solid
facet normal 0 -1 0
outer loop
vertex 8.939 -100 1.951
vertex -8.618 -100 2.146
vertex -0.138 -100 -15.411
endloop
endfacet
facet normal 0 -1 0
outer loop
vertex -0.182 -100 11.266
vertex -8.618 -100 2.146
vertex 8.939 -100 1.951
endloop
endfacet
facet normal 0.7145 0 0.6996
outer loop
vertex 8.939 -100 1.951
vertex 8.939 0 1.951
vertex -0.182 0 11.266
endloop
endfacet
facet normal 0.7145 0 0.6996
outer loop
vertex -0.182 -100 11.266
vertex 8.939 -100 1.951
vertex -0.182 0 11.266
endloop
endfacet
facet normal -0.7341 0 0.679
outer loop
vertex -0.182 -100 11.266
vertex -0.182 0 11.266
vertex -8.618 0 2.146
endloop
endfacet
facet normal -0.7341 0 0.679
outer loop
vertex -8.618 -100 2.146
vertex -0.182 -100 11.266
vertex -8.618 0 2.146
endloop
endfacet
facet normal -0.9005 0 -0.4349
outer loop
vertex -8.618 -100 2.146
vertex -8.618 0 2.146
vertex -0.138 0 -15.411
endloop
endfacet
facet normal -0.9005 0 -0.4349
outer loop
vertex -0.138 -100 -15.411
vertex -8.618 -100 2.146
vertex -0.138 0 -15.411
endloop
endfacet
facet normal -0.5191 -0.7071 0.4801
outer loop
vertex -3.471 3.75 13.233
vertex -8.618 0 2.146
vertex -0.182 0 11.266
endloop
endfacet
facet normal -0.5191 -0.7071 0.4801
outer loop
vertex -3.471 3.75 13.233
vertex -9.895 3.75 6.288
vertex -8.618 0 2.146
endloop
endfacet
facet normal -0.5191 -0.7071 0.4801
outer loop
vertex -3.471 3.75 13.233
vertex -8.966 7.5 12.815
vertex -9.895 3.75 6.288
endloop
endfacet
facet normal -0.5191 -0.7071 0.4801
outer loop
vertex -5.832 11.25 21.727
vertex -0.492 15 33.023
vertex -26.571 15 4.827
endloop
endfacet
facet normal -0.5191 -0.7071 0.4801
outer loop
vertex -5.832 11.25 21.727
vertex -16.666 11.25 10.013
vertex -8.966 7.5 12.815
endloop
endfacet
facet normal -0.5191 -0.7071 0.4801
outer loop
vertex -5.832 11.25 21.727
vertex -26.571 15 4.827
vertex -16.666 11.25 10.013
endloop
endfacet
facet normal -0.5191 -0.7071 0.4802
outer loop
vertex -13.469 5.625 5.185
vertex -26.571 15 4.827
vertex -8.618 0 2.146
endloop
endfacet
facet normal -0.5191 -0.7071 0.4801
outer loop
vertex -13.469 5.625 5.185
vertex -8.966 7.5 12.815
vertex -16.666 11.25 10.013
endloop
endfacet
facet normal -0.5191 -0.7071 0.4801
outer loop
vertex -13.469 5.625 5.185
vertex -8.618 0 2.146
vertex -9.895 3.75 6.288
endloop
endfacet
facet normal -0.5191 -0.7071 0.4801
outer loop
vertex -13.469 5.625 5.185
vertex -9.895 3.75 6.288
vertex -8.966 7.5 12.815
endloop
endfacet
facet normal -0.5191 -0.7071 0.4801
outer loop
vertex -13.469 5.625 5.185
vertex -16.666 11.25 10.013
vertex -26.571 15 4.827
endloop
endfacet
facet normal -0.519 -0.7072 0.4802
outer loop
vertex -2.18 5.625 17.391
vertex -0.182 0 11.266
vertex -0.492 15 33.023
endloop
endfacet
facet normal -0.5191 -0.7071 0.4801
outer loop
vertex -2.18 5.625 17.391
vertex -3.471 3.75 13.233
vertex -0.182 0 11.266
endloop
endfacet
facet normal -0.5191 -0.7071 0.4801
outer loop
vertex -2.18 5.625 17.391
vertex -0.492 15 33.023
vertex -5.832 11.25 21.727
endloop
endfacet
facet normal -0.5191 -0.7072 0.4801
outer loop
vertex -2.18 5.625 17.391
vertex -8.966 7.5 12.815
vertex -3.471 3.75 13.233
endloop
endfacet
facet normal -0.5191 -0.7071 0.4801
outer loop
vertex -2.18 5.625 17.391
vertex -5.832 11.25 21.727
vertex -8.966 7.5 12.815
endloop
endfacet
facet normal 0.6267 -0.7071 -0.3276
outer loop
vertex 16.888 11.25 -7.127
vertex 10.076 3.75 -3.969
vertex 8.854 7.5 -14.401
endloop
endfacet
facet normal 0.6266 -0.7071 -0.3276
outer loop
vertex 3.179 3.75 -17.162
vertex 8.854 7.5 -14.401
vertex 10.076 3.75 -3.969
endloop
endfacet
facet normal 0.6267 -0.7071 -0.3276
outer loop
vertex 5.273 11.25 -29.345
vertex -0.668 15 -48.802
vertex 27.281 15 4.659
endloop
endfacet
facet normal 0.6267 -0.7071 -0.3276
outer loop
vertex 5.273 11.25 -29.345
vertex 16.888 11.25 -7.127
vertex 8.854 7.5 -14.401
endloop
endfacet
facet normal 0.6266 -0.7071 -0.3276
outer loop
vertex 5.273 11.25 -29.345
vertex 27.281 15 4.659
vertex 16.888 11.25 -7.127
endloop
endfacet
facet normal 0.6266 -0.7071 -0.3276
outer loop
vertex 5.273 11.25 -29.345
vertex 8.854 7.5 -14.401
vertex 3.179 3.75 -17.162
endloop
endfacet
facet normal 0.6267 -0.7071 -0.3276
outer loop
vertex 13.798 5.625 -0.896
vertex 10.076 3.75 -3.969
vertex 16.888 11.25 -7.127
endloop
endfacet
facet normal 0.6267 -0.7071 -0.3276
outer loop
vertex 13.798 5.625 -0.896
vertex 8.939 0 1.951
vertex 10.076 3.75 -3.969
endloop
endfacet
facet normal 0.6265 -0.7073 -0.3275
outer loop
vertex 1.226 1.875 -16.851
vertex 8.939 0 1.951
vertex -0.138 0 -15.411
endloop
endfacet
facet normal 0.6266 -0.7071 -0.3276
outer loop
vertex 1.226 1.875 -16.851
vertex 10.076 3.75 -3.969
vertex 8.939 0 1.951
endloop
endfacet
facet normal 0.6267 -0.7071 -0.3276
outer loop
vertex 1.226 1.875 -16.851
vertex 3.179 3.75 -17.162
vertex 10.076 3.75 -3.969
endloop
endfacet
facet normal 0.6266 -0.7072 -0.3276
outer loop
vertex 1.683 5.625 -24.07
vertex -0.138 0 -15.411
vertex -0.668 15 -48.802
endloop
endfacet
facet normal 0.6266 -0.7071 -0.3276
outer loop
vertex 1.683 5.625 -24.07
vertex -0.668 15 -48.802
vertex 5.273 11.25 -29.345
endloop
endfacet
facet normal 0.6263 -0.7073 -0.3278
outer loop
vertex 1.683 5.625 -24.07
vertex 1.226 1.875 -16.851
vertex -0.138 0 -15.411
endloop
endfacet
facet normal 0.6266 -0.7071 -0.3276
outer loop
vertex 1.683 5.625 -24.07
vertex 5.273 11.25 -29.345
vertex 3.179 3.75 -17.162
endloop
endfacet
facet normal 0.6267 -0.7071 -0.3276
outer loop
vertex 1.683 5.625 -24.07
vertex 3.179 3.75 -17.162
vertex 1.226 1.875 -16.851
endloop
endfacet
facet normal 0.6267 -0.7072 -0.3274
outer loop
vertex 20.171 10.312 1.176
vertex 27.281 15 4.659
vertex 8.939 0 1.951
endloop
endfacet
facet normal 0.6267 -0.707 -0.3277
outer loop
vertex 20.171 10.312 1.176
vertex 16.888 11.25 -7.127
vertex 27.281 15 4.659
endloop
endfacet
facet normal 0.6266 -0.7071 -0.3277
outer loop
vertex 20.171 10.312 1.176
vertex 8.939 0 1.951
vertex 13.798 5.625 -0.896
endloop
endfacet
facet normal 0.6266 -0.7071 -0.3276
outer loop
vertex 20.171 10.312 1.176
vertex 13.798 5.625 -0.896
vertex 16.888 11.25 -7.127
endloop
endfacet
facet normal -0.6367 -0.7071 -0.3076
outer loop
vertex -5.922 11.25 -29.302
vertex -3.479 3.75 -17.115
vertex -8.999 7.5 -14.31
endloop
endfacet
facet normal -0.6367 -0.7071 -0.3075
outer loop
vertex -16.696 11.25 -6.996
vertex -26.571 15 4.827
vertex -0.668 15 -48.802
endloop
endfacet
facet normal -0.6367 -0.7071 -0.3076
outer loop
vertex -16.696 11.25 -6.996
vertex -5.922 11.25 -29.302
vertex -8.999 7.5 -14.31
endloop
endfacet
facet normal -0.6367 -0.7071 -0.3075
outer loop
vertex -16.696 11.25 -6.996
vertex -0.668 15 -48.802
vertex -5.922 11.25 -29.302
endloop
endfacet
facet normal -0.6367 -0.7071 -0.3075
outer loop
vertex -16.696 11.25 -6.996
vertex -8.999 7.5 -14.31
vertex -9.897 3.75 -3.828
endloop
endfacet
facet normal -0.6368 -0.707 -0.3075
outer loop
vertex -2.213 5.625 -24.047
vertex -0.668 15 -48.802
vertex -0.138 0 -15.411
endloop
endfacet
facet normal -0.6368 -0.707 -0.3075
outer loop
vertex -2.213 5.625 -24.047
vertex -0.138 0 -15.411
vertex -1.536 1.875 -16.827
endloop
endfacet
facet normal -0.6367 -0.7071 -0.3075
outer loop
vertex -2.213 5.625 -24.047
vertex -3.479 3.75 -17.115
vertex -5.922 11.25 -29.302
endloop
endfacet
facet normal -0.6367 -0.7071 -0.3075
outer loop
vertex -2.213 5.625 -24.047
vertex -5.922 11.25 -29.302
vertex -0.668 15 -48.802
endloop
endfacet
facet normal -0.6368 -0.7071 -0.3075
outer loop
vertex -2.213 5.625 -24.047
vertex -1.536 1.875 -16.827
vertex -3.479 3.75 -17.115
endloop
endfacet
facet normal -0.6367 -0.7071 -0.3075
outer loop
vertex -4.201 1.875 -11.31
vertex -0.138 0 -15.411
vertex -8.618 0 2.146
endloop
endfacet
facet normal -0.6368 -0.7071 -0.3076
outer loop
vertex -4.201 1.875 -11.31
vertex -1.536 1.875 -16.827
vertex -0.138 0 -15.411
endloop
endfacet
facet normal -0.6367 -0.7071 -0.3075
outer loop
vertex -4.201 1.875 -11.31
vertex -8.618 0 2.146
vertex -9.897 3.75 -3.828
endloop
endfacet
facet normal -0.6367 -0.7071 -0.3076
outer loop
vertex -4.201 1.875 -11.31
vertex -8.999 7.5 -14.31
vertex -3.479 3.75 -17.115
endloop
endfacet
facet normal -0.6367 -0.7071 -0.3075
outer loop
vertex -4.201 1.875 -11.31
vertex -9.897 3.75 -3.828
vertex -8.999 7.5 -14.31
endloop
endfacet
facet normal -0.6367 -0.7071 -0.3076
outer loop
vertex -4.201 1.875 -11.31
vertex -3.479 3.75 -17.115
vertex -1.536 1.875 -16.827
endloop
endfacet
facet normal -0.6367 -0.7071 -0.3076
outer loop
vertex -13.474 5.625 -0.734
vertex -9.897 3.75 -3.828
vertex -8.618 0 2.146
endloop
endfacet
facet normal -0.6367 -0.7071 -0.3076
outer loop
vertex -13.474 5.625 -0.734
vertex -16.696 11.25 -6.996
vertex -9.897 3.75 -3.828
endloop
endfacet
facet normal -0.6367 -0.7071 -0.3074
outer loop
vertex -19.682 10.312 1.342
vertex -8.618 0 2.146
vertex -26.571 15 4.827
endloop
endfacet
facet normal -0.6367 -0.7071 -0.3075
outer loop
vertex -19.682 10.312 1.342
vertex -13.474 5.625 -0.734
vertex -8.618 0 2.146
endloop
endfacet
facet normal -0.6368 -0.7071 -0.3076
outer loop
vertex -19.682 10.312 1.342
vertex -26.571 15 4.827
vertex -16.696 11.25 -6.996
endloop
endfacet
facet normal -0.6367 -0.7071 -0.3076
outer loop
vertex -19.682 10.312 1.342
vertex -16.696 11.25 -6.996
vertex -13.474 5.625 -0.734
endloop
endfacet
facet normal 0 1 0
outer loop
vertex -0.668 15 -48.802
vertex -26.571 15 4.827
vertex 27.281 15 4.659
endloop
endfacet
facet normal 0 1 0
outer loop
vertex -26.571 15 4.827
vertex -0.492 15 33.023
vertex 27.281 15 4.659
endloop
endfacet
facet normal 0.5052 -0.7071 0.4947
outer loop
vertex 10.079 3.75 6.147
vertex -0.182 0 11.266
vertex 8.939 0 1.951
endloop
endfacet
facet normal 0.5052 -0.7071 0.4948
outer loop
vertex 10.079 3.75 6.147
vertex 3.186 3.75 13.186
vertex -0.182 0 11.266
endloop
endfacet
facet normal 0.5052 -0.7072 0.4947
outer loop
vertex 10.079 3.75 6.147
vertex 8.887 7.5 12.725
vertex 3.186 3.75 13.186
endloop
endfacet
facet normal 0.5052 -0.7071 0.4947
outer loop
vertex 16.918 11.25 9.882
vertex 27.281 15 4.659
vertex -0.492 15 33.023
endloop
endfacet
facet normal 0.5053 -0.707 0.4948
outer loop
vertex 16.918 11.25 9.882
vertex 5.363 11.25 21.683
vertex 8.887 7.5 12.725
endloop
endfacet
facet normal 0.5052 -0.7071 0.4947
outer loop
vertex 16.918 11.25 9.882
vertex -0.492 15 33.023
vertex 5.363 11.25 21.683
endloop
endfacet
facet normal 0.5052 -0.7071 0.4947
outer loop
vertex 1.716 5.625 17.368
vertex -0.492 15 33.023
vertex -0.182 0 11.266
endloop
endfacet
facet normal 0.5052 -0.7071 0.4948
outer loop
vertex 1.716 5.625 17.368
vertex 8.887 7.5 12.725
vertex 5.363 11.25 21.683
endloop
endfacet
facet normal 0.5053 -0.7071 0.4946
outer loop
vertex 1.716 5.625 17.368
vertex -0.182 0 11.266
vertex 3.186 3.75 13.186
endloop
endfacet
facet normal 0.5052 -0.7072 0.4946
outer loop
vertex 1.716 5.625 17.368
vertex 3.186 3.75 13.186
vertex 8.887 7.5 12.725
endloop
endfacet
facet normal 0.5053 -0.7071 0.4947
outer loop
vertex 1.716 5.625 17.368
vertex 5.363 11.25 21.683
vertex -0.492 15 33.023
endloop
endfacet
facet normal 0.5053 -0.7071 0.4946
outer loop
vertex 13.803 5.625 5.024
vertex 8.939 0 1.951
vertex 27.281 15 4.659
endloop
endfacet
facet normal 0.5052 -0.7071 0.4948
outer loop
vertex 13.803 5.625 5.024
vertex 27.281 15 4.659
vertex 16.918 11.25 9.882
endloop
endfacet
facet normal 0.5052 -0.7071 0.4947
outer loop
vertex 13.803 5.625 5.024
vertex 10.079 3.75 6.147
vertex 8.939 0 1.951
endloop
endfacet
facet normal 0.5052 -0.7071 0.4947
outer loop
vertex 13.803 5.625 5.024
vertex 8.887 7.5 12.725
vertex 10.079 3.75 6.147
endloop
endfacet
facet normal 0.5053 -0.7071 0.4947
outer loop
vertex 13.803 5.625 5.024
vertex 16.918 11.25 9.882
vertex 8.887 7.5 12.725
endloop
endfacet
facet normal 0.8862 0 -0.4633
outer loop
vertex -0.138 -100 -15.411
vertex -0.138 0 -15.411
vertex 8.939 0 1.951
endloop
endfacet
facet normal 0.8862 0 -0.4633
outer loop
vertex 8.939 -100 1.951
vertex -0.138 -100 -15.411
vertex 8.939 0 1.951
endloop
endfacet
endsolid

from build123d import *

# Parameters (mm, degrees)
F1_DEPTH = 100
F2_DEPTH = 15
F2_TAPER = -45


with BuildPart() as f1:
    # F0 (on Front) → F1 (new body)
    with BuildSketch(Plane.XZ):
        Polygon((-0.1822671791, 11.2663906845), (-8.618093033, 2.1458949195), (-0.1375637321, -15.4114313191), (8.9392346026, 1.9508140394), align=None)
    extrude(amount=F1_DEPTH)

    # F1_face (on face) → F2 (join)
    with BuildSketch(Plane(origin=(0.0560458234, 0, -0.7001079654), x_dir=(1, 0, 0), z_dir=(0, 1, 0))):
        Polygon((-8.6741388563, -2.8460028849), (-0.2383130025, -11.9664986499), (8.8831887792, -2.6509220048), (-0.1936095555, 14.7113233537), align=None)
    extrude(amount=F2_DEPTH, taper=F2_TAPER)


solid = f1.part
